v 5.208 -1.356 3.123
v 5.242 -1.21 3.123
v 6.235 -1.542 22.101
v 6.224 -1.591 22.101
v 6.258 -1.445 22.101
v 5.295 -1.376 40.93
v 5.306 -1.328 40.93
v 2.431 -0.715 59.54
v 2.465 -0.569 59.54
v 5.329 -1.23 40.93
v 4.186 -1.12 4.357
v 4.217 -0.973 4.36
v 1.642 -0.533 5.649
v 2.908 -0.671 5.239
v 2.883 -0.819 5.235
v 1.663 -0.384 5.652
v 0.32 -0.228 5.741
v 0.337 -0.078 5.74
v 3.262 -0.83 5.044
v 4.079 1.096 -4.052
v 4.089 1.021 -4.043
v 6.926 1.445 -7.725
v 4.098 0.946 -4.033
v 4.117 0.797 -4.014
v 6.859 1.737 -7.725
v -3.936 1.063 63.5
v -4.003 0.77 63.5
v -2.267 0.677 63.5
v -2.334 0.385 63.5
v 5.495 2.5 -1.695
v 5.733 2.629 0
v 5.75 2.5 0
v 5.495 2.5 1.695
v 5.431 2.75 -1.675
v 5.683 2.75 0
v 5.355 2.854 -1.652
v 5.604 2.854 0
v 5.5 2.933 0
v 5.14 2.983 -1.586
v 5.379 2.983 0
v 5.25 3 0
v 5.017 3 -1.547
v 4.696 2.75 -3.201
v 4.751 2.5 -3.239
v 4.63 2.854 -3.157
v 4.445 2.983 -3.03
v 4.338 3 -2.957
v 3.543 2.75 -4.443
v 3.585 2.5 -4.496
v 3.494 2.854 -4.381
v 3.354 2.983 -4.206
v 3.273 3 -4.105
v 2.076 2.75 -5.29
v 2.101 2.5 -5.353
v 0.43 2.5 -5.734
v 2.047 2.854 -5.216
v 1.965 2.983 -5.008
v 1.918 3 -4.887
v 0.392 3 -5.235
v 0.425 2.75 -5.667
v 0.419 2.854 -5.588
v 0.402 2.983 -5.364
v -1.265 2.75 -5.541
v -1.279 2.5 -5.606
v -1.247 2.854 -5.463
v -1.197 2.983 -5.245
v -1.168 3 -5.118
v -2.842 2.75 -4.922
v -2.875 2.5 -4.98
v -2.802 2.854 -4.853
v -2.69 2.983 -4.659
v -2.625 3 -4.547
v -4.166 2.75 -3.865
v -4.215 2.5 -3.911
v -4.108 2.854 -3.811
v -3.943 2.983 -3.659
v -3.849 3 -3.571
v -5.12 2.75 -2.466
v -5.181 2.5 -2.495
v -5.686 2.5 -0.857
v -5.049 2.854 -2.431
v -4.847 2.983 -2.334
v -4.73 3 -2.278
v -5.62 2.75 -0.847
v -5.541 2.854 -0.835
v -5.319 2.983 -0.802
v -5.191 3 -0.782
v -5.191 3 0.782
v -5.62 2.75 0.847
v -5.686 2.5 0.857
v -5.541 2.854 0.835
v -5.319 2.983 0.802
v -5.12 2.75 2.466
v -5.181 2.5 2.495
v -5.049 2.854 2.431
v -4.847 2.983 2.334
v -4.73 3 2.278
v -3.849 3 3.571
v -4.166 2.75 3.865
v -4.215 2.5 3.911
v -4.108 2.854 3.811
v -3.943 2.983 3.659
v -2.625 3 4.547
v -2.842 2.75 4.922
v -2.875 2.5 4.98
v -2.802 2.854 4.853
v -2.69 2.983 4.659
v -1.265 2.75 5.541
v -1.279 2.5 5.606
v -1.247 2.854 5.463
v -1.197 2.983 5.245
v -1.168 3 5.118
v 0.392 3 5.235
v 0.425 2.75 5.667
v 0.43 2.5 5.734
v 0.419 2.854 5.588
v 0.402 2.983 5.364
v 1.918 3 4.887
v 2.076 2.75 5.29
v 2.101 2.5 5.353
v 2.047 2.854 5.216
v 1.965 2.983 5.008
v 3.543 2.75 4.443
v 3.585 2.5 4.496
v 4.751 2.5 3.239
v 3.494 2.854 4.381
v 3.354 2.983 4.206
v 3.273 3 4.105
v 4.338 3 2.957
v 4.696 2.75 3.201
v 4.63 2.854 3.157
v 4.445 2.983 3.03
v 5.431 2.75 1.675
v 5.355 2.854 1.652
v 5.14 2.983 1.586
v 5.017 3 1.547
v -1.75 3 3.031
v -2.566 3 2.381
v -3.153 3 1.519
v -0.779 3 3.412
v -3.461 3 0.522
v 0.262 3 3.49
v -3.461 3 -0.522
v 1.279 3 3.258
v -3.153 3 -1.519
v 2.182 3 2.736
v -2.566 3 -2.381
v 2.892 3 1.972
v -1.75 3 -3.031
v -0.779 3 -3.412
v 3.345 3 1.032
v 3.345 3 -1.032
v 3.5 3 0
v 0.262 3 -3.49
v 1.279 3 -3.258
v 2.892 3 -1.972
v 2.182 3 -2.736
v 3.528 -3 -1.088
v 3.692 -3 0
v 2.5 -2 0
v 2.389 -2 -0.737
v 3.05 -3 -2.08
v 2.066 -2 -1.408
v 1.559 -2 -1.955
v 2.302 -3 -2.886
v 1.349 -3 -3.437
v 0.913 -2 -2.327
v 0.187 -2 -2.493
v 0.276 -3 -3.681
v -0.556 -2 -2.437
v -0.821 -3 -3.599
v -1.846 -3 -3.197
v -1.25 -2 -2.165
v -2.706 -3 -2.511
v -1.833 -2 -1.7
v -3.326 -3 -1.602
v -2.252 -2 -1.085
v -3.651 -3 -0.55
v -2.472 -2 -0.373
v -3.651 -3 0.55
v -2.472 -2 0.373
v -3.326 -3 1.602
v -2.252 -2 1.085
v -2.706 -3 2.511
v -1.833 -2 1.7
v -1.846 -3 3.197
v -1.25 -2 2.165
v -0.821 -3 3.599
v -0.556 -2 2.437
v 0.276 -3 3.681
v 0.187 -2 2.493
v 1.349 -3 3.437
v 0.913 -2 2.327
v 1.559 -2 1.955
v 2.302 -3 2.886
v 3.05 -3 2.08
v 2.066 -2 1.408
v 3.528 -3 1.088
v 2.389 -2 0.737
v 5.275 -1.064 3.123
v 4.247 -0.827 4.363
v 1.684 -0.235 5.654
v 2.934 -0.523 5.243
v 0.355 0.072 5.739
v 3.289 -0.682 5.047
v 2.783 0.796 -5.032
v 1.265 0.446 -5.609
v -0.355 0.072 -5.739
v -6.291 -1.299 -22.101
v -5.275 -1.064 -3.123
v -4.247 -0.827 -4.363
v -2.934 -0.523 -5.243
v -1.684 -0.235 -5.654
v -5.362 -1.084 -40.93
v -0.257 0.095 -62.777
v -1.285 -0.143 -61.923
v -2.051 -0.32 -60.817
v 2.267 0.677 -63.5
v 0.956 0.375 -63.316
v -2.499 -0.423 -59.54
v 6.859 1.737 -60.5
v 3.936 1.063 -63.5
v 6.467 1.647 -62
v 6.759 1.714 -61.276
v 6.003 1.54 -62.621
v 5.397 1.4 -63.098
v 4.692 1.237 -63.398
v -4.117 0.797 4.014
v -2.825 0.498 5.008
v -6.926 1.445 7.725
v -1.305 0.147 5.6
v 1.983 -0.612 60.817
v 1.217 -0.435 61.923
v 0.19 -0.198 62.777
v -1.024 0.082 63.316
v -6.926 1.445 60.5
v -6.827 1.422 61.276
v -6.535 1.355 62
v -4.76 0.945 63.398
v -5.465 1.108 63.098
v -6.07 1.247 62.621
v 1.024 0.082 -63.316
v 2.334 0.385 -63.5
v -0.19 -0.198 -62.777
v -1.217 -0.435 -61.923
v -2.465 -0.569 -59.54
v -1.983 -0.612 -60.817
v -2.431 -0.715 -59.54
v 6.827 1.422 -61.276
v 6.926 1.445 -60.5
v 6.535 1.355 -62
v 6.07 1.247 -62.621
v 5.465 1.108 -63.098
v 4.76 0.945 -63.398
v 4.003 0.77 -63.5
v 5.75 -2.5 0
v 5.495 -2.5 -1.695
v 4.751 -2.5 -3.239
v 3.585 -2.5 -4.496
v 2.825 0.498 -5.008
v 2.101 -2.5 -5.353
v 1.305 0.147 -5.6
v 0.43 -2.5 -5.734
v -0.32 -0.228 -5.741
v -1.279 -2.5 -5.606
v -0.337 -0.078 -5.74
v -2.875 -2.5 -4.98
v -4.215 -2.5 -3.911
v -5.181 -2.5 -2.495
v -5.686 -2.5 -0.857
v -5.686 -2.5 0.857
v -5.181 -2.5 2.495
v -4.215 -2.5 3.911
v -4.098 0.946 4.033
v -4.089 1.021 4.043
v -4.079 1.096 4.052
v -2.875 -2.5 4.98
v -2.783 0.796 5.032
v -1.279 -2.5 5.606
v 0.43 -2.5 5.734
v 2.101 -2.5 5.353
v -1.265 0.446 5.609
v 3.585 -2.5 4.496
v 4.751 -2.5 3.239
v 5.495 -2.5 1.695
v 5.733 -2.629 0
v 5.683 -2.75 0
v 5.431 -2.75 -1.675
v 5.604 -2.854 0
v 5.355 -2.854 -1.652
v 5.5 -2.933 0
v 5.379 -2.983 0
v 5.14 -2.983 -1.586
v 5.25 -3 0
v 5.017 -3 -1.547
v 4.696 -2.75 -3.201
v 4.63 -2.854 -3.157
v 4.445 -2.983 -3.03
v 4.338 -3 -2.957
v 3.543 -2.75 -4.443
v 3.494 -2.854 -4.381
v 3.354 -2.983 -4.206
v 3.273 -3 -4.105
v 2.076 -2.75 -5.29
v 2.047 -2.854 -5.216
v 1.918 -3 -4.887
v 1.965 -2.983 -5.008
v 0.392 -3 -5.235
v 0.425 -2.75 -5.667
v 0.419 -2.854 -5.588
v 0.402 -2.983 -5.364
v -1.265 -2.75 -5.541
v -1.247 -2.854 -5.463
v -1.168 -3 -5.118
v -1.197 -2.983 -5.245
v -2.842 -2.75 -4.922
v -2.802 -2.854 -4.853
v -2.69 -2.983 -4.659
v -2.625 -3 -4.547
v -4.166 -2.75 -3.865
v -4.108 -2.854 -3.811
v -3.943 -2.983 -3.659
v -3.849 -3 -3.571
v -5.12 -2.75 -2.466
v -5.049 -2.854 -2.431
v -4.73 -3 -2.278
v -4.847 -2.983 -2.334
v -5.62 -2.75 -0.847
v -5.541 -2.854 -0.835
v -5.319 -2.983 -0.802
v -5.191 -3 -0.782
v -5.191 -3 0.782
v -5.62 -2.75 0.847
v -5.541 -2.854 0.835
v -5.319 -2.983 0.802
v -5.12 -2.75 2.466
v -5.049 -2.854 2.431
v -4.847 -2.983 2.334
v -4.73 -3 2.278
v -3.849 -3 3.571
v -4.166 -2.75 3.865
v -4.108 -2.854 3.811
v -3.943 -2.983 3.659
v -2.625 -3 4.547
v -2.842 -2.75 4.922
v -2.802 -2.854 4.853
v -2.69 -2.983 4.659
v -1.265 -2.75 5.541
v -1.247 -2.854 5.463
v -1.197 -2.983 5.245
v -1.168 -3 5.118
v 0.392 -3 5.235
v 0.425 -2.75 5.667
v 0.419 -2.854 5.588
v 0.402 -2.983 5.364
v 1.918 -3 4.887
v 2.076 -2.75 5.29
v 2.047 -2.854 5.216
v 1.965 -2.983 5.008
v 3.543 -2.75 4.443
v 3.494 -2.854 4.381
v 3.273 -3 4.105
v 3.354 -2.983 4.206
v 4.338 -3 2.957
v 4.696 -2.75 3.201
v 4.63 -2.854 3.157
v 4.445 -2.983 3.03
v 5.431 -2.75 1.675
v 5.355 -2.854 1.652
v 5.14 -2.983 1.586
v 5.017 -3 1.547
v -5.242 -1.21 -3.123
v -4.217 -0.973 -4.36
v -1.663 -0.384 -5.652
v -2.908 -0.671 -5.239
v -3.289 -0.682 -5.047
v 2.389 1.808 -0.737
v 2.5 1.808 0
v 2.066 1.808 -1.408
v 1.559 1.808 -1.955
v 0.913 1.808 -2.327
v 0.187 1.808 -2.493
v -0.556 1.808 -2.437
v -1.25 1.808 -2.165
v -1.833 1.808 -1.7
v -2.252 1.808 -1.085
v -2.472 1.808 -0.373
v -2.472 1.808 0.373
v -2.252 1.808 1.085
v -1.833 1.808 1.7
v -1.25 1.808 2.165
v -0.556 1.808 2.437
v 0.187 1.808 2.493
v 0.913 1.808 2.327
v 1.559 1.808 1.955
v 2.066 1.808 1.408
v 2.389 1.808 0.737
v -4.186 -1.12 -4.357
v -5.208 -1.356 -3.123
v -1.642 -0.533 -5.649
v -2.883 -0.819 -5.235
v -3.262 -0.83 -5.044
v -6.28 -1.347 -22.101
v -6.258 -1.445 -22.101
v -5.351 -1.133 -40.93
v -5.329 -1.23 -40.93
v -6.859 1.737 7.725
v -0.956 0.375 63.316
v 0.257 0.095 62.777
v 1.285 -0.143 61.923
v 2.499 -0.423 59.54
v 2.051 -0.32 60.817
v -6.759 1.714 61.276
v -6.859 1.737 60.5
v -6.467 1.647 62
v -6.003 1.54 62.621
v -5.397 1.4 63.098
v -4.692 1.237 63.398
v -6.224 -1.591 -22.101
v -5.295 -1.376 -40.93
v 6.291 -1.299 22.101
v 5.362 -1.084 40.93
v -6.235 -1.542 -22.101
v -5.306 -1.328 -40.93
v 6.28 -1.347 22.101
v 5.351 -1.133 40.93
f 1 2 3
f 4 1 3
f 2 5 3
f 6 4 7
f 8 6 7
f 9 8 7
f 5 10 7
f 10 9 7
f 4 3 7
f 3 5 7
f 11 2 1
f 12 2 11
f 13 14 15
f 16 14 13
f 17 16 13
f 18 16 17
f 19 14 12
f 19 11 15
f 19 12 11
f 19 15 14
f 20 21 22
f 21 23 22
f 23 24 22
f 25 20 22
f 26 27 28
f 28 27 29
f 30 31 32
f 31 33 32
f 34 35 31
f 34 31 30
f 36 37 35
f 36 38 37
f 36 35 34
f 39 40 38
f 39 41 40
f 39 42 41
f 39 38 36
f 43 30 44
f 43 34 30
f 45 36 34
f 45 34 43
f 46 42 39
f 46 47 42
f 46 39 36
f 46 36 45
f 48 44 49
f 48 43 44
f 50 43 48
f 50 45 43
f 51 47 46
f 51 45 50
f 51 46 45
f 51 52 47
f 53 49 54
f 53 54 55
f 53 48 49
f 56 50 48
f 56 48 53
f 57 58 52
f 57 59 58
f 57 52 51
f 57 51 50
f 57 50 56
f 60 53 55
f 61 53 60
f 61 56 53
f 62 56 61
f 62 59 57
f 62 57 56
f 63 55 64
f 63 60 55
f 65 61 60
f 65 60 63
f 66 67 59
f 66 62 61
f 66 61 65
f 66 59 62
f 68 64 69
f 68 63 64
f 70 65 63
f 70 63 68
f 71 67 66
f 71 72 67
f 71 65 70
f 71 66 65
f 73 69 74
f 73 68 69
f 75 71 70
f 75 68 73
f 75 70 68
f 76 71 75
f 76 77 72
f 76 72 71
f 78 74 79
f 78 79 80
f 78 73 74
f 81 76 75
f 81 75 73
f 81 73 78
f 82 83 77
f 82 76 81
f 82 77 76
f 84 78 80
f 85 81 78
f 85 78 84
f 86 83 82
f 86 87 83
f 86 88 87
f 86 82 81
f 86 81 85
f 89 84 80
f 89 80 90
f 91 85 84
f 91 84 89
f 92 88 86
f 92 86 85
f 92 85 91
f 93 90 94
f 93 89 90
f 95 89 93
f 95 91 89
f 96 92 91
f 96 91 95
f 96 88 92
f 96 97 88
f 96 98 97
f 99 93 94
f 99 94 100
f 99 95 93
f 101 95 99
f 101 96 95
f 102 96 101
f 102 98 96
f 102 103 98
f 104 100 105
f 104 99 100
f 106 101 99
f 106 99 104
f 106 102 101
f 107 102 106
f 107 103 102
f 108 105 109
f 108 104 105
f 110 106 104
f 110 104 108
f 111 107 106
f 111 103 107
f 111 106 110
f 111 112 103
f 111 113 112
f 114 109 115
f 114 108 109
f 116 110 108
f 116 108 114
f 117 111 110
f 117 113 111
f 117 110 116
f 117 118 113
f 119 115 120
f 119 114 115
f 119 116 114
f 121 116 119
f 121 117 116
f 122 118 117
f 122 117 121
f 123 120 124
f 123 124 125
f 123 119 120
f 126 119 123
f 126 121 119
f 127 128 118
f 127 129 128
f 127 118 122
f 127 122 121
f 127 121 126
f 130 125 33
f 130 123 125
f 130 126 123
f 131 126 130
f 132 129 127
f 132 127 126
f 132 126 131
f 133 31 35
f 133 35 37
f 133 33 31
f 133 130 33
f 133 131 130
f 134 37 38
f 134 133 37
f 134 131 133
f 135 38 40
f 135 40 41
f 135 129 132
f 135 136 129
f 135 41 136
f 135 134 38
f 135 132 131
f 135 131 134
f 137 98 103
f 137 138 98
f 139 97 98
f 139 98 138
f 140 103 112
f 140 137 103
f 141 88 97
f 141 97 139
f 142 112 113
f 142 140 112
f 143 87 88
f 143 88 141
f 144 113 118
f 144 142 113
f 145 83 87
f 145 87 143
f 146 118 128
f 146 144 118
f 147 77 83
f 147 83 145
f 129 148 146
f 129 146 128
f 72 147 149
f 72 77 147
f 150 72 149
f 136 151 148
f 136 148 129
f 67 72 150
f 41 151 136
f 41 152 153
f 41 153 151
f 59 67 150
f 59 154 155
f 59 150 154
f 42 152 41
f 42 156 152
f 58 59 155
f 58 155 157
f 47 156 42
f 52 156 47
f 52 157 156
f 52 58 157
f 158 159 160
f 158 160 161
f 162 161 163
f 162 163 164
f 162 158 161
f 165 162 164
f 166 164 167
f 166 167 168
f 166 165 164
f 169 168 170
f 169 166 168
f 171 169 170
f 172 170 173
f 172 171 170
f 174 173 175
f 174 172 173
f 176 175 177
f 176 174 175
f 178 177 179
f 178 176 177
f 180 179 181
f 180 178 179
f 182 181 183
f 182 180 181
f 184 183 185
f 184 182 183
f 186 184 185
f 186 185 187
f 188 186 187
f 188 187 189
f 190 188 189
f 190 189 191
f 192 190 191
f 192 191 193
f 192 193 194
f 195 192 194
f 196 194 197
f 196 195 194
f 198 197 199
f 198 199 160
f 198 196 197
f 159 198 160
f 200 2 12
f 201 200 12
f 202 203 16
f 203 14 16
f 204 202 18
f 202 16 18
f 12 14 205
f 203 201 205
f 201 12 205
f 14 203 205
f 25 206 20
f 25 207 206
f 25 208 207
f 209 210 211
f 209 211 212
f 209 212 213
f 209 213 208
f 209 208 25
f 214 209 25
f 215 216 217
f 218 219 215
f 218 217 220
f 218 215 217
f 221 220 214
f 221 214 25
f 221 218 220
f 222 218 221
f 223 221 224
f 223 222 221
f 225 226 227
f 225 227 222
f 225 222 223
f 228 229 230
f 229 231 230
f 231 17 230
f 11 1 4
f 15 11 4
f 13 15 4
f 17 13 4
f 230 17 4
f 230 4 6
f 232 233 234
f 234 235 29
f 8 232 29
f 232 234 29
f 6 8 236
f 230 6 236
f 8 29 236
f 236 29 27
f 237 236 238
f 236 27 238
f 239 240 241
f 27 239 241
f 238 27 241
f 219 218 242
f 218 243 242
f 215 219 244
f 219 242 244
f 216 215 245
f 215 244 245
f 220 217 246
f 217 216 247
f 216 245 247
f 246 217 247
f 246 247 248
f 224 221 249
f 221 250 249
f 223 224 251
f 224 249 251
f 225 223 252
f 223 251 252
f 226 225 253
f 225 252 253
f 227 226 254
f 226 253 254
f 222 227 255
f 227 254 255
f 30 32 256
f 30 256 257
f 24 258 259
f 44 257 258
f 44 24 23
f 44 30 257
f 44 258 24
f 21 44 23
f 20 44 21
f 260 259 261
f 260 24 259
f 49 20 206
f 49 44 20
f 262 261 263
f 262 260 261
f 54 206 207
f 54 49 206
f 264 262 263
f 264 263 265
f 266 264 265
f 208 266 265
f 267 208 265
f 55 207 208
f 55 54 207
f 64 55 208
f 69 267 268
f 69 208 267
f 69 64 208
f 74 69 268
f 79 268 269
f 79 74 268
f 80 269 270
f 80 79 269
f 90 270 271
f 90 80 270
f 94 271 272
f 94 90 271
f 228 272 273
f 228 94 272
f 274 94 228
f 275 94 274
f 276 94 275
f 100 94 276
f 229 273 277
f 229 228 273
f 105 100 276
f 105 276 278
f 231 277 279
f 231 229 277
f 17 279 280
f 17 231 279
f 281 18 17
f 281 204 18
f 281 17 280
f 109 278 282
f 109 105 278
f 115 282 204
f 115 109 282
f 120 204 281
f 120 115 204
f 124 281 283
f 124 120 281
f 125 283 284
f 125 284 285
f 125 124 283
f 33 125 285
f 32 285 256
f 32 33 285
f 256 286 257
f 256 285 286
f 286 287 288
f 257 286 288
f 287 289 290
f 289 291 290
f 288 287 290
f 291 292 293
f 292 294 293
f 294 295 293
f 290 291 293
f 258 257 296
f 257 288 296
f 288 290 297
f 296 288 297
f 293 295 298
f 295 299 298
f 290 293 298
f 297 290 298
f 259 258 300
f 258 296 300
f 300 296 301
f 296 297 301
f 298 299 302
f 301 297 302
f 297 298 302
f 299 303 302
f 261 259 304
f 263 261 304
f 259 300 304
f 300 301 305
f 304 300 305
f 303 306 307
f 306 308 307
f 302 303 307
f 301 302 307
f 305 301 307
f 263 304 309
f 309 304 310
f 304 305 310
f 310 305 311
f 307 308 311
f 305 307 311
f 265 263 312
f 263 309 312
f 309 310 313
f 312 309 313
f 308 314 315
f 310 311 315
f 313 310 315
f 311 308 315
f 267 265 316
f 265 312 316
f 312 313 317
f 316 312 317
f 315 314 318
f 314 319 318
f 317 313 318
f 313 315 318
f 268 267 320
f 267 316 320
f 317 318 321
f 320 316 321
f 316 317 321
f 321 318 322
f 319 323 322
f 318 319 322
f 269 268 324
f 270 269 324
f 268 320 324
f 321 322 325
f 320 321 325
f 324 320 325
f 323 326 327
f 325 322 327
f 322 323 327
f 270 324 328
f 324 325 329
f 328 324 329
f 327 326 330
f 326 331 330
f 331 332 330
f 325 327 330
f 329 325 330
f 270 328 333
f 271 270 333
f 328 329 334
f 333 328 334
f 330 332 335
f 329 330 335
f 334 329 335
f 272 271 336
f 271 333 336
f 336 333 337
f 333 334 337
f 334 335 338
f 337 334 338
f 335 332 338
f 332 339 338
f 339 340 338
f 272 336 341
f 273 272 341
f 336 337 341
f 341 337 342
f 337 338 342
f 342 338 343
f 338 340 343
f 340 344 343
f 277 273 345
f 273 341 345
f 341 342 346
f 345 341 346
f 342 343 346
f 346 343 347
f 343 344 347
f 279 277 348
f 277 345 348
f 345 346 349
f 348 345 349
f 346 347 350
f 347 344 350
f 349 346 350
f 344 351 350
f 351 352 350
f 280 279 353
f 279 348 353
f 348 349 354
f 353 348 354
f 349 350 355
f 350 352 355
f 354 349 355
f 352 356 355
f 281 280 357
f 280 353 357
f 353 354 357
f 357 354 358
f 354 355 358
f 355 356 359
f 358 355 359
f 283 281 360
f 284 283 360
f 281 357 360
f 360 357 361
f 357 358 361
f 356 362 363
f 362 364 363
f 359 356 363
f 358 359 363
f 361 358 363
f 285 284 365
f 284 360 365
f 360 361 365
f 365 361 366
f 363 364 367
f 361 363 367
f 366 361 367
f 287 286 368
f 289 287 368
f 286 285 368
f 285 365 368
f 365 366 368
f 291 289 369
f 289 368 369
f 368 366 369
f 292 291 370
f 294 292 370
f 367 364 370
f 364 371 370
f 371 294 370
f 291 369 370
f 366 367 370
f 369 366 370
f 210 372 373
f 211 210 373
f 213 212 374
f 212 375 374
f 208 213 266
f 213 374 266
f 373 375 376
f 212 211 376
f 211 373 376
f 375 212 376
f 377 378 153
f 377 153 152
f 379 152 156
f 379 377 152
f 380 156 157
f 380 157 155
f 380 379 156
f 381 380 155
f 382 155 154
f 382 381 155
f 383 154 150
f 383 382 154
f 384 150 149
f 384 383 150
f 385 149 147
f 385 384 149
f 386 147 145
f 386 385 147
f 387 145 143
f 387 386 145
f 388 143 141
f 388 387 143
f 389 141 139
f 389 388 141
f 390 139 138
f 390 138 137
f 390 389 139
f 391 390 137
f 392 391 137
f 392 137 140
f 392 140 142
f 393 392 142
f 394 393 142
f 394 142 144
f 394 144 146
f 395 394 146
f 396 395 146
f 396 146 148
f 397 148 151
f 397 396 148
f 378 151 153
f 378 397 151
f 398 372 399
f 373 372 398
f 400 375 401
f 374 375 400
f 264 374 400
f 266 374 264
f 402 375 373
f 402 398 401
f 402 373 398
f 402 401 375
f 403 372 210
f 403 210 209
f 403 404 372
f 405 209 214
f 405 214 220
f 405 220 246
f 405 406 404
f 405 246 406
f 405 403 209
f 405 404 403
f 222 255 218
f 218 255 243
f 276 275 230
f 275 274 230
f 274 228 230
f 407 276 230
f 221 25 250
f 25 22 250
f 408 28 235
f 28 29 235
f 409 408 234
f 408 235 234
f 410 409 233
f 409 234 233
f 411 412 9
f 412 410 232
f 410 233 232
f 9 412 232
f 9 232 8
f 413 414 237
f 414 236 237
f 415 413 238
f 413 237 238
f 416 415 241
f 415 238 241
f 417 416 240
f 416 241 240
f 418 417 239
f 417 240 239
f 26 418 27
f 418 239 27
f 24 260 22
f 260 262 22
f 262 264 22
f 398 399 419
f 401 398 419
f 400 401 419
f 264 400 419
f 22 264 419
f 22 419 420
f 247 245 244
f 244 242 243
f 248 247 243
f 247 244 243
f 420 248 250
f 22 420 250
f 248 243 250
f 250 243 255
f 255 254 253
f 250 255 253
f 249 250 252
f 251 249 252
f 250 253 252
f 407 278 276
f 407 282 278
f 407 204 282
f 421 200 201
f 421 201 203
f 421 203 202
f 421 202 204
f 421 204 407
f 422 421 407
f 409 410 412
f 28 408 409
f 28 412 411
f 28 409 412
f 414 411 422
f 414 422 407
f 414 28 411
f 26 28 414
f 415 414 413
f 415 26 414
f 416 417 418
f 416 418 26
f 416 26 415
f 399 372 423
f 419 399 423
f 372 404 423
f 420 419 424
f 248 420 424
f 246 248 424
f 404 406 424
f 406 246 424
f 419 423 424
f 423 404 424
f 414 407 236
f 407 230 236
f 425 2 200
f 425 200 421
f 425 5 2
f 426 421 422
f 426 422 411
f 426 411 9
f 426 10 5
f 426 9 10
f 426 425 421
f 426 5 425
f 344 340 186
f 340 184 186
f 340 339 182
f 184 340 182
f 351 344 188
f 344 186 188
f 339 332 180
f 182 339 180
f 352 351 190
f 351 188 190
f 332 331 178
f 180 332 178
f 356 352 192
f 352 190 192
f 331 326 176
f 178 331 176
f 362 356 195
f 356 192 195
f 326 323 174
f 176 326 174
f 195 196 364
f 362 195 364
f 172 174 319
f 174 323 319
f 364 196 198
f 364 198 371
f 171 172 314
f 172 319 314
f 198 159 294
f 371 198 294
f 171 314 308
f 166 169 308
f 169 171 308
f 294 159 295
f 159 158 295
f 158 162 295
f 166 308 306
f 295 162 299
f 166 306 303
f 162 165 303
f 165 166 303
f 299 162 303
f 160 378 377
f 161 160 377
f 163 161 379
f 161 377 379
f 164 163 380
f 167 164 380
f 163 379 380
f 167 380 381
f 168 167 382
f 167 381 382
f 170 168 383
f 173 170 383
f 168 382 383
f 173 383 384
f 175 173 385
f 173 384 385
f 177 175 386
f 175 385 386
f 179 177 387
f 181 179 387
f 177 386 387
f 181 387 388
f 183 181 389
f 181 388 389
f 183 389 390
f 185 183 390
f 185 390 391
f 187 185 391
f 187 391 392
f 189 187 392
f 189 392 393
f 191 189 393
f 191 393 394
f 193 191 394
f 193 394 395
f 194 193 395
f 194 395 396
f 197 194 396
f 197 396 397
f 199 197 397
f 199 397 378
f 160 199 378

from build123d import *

# Parameters (mm, degrees)
SKETCH1_R             = 5.75
BOSS_EXTRUDE1_DEPTH   = 3
BOSS_EXTRUDE2_DEPTH   = 0.15
CIRPATTERN1_COUNT     = 2
SKETCH4_R             = 2.5
CUT_EXTRUDE1_DEPTH    = 7.0000001
FILLET1_R             = 0.5
CHAMFER1_SIZE         = 1
CHAMFER1_SIZE2        = 1.191753593
CHAMFER1_PART_2_SIZE  = 1
CHAMFER1_PART_2_SIZE2 = 1.191753593


with BuildPart() as part:
    # Sketch1 → Boss-Extrude1 (new body, symmetric)
    with BuildSketch(Plane(origin=(0, 0, 0), x_dir=(1, 0, 0), z_dir=(0, 1, 0))):
        Circle(SKETCH1_R)
    extrude(amount=BOSS_EXTRUDE1_DEPTH, both=True)

    # Sketch3 → Boss-Extrude2 (add, symmetric)
    with BuildSketch(Plane(origin=(0, 0, 0), x_dir=(0.974370065, -0.224951054, 0), z_dir=(-0.224951054, -0.974370065, 0))):
        with BuildLine():
            Line((-3.7810451, 3.485569564), (-7.073832927, 7.724962303))
            Line((-7.073832927, 7.724962303), (-7.073832927, 60.5))
            ThreePointArc((-7.073832927, 60.5), (-6.19515327, 62.621320344), (-4.073832927, 63.5))
            Line((-4.073832927, 63.5), (-2.360798549, 63.5))
            ThreePointArc((-2.360798549, 63.5), (0.785773005, 62.385754426), (2.529923187, 59.539634982))
            add(Edge.make_bspline(
                [(5.379401291, 3.122506591), (7.423883814, 22.153749757), (6.457878795, 41.061478518), (2.529923187, 59.539634982)],
                knots=[0, 0, 0, 0, 0.933242383, 0.933242383, 0.933242383, 0.933242383], degree=3))
            add(Edge.make_bspline(
                [(5.379401291, 3.122506591), (1.050826141, 9.991793378), (-3.7810451, 3.485569564)],
                knots=[5.286447688, 5.286447688, 5.286447688, 7.20272538, 7.20272538, 7.20272538], degree=2, weights=[1, 0.575043633, 1]))
        make_face()
    boss_extrude2 = extrude(amount=BOSS_EXTRUDE2_DEPTH, both=True)

    # CirPattern1: Boss-Extrude2 ×2 about axis
    cirpattern1_axis = Axis((0, 3, 0), (0, -1, 0))
    for i in range(1, CIRPATTERN1_COUNT):
        add(boss_extrude2.rotate(cirpattern1_axis, i * 360 / CIRPATTERN1_COUNT))

    # Sketch4 → Cut-Extrude1 (cut, through all)
    with BuildSketch(Plane(origin=(0, 3, 0), x_dir=(1, 0, 0), z_dir=(0, 1, 0))):
        Circle(SKETCH4_R)
    extrude(amount=-CUT_EXTRUDE1_DEPTH, mode=Mode.SUBTRACT)

    # Fillet1
    fillet1_edges = [part.edges().sort_by_distance(p)[0] for p in [
        (-5.75, -3, 0),
        (-5.75, 3, 0),
    ]]
    fillet(fillet1_edges, radius=FILLET1_R)

    # Chamfer1
    chamfer1_edges = [part.edges().sort_by_distance(p)[0] for p in [
        (-2.5, -3, 0),
    ]]
    chamfer1_side = [part.faces().sort_by_distance(p)[0] for p in [
        (-2.5, 0, 0),
    ]]
    chamfer(chamfer1_edges, length=CHAMFER1_SIZE, length2=CHAMFER1_SIZE2, reference=chamfer1_side[0])

    # Chamfer1 part 2
    chamfer1_part_2_edges = [part.edges().sort_by_distance(p)[0] for p in [
        (-2.5, 3, 0),
    ]]
    chamfer1_part_2_side = [part.faces().sort_by_distance(p)[0] for p in [
        (-5.101507576, 3, 0),
    ]]
    chamfer(chamfer1_part_2_edges, length=CHAMFER1_PART_2_SIZE, length2=CHAMFER1_PART_2_SIZE2, reference=chamfer1_part_2_side[0])


solid = part.part
